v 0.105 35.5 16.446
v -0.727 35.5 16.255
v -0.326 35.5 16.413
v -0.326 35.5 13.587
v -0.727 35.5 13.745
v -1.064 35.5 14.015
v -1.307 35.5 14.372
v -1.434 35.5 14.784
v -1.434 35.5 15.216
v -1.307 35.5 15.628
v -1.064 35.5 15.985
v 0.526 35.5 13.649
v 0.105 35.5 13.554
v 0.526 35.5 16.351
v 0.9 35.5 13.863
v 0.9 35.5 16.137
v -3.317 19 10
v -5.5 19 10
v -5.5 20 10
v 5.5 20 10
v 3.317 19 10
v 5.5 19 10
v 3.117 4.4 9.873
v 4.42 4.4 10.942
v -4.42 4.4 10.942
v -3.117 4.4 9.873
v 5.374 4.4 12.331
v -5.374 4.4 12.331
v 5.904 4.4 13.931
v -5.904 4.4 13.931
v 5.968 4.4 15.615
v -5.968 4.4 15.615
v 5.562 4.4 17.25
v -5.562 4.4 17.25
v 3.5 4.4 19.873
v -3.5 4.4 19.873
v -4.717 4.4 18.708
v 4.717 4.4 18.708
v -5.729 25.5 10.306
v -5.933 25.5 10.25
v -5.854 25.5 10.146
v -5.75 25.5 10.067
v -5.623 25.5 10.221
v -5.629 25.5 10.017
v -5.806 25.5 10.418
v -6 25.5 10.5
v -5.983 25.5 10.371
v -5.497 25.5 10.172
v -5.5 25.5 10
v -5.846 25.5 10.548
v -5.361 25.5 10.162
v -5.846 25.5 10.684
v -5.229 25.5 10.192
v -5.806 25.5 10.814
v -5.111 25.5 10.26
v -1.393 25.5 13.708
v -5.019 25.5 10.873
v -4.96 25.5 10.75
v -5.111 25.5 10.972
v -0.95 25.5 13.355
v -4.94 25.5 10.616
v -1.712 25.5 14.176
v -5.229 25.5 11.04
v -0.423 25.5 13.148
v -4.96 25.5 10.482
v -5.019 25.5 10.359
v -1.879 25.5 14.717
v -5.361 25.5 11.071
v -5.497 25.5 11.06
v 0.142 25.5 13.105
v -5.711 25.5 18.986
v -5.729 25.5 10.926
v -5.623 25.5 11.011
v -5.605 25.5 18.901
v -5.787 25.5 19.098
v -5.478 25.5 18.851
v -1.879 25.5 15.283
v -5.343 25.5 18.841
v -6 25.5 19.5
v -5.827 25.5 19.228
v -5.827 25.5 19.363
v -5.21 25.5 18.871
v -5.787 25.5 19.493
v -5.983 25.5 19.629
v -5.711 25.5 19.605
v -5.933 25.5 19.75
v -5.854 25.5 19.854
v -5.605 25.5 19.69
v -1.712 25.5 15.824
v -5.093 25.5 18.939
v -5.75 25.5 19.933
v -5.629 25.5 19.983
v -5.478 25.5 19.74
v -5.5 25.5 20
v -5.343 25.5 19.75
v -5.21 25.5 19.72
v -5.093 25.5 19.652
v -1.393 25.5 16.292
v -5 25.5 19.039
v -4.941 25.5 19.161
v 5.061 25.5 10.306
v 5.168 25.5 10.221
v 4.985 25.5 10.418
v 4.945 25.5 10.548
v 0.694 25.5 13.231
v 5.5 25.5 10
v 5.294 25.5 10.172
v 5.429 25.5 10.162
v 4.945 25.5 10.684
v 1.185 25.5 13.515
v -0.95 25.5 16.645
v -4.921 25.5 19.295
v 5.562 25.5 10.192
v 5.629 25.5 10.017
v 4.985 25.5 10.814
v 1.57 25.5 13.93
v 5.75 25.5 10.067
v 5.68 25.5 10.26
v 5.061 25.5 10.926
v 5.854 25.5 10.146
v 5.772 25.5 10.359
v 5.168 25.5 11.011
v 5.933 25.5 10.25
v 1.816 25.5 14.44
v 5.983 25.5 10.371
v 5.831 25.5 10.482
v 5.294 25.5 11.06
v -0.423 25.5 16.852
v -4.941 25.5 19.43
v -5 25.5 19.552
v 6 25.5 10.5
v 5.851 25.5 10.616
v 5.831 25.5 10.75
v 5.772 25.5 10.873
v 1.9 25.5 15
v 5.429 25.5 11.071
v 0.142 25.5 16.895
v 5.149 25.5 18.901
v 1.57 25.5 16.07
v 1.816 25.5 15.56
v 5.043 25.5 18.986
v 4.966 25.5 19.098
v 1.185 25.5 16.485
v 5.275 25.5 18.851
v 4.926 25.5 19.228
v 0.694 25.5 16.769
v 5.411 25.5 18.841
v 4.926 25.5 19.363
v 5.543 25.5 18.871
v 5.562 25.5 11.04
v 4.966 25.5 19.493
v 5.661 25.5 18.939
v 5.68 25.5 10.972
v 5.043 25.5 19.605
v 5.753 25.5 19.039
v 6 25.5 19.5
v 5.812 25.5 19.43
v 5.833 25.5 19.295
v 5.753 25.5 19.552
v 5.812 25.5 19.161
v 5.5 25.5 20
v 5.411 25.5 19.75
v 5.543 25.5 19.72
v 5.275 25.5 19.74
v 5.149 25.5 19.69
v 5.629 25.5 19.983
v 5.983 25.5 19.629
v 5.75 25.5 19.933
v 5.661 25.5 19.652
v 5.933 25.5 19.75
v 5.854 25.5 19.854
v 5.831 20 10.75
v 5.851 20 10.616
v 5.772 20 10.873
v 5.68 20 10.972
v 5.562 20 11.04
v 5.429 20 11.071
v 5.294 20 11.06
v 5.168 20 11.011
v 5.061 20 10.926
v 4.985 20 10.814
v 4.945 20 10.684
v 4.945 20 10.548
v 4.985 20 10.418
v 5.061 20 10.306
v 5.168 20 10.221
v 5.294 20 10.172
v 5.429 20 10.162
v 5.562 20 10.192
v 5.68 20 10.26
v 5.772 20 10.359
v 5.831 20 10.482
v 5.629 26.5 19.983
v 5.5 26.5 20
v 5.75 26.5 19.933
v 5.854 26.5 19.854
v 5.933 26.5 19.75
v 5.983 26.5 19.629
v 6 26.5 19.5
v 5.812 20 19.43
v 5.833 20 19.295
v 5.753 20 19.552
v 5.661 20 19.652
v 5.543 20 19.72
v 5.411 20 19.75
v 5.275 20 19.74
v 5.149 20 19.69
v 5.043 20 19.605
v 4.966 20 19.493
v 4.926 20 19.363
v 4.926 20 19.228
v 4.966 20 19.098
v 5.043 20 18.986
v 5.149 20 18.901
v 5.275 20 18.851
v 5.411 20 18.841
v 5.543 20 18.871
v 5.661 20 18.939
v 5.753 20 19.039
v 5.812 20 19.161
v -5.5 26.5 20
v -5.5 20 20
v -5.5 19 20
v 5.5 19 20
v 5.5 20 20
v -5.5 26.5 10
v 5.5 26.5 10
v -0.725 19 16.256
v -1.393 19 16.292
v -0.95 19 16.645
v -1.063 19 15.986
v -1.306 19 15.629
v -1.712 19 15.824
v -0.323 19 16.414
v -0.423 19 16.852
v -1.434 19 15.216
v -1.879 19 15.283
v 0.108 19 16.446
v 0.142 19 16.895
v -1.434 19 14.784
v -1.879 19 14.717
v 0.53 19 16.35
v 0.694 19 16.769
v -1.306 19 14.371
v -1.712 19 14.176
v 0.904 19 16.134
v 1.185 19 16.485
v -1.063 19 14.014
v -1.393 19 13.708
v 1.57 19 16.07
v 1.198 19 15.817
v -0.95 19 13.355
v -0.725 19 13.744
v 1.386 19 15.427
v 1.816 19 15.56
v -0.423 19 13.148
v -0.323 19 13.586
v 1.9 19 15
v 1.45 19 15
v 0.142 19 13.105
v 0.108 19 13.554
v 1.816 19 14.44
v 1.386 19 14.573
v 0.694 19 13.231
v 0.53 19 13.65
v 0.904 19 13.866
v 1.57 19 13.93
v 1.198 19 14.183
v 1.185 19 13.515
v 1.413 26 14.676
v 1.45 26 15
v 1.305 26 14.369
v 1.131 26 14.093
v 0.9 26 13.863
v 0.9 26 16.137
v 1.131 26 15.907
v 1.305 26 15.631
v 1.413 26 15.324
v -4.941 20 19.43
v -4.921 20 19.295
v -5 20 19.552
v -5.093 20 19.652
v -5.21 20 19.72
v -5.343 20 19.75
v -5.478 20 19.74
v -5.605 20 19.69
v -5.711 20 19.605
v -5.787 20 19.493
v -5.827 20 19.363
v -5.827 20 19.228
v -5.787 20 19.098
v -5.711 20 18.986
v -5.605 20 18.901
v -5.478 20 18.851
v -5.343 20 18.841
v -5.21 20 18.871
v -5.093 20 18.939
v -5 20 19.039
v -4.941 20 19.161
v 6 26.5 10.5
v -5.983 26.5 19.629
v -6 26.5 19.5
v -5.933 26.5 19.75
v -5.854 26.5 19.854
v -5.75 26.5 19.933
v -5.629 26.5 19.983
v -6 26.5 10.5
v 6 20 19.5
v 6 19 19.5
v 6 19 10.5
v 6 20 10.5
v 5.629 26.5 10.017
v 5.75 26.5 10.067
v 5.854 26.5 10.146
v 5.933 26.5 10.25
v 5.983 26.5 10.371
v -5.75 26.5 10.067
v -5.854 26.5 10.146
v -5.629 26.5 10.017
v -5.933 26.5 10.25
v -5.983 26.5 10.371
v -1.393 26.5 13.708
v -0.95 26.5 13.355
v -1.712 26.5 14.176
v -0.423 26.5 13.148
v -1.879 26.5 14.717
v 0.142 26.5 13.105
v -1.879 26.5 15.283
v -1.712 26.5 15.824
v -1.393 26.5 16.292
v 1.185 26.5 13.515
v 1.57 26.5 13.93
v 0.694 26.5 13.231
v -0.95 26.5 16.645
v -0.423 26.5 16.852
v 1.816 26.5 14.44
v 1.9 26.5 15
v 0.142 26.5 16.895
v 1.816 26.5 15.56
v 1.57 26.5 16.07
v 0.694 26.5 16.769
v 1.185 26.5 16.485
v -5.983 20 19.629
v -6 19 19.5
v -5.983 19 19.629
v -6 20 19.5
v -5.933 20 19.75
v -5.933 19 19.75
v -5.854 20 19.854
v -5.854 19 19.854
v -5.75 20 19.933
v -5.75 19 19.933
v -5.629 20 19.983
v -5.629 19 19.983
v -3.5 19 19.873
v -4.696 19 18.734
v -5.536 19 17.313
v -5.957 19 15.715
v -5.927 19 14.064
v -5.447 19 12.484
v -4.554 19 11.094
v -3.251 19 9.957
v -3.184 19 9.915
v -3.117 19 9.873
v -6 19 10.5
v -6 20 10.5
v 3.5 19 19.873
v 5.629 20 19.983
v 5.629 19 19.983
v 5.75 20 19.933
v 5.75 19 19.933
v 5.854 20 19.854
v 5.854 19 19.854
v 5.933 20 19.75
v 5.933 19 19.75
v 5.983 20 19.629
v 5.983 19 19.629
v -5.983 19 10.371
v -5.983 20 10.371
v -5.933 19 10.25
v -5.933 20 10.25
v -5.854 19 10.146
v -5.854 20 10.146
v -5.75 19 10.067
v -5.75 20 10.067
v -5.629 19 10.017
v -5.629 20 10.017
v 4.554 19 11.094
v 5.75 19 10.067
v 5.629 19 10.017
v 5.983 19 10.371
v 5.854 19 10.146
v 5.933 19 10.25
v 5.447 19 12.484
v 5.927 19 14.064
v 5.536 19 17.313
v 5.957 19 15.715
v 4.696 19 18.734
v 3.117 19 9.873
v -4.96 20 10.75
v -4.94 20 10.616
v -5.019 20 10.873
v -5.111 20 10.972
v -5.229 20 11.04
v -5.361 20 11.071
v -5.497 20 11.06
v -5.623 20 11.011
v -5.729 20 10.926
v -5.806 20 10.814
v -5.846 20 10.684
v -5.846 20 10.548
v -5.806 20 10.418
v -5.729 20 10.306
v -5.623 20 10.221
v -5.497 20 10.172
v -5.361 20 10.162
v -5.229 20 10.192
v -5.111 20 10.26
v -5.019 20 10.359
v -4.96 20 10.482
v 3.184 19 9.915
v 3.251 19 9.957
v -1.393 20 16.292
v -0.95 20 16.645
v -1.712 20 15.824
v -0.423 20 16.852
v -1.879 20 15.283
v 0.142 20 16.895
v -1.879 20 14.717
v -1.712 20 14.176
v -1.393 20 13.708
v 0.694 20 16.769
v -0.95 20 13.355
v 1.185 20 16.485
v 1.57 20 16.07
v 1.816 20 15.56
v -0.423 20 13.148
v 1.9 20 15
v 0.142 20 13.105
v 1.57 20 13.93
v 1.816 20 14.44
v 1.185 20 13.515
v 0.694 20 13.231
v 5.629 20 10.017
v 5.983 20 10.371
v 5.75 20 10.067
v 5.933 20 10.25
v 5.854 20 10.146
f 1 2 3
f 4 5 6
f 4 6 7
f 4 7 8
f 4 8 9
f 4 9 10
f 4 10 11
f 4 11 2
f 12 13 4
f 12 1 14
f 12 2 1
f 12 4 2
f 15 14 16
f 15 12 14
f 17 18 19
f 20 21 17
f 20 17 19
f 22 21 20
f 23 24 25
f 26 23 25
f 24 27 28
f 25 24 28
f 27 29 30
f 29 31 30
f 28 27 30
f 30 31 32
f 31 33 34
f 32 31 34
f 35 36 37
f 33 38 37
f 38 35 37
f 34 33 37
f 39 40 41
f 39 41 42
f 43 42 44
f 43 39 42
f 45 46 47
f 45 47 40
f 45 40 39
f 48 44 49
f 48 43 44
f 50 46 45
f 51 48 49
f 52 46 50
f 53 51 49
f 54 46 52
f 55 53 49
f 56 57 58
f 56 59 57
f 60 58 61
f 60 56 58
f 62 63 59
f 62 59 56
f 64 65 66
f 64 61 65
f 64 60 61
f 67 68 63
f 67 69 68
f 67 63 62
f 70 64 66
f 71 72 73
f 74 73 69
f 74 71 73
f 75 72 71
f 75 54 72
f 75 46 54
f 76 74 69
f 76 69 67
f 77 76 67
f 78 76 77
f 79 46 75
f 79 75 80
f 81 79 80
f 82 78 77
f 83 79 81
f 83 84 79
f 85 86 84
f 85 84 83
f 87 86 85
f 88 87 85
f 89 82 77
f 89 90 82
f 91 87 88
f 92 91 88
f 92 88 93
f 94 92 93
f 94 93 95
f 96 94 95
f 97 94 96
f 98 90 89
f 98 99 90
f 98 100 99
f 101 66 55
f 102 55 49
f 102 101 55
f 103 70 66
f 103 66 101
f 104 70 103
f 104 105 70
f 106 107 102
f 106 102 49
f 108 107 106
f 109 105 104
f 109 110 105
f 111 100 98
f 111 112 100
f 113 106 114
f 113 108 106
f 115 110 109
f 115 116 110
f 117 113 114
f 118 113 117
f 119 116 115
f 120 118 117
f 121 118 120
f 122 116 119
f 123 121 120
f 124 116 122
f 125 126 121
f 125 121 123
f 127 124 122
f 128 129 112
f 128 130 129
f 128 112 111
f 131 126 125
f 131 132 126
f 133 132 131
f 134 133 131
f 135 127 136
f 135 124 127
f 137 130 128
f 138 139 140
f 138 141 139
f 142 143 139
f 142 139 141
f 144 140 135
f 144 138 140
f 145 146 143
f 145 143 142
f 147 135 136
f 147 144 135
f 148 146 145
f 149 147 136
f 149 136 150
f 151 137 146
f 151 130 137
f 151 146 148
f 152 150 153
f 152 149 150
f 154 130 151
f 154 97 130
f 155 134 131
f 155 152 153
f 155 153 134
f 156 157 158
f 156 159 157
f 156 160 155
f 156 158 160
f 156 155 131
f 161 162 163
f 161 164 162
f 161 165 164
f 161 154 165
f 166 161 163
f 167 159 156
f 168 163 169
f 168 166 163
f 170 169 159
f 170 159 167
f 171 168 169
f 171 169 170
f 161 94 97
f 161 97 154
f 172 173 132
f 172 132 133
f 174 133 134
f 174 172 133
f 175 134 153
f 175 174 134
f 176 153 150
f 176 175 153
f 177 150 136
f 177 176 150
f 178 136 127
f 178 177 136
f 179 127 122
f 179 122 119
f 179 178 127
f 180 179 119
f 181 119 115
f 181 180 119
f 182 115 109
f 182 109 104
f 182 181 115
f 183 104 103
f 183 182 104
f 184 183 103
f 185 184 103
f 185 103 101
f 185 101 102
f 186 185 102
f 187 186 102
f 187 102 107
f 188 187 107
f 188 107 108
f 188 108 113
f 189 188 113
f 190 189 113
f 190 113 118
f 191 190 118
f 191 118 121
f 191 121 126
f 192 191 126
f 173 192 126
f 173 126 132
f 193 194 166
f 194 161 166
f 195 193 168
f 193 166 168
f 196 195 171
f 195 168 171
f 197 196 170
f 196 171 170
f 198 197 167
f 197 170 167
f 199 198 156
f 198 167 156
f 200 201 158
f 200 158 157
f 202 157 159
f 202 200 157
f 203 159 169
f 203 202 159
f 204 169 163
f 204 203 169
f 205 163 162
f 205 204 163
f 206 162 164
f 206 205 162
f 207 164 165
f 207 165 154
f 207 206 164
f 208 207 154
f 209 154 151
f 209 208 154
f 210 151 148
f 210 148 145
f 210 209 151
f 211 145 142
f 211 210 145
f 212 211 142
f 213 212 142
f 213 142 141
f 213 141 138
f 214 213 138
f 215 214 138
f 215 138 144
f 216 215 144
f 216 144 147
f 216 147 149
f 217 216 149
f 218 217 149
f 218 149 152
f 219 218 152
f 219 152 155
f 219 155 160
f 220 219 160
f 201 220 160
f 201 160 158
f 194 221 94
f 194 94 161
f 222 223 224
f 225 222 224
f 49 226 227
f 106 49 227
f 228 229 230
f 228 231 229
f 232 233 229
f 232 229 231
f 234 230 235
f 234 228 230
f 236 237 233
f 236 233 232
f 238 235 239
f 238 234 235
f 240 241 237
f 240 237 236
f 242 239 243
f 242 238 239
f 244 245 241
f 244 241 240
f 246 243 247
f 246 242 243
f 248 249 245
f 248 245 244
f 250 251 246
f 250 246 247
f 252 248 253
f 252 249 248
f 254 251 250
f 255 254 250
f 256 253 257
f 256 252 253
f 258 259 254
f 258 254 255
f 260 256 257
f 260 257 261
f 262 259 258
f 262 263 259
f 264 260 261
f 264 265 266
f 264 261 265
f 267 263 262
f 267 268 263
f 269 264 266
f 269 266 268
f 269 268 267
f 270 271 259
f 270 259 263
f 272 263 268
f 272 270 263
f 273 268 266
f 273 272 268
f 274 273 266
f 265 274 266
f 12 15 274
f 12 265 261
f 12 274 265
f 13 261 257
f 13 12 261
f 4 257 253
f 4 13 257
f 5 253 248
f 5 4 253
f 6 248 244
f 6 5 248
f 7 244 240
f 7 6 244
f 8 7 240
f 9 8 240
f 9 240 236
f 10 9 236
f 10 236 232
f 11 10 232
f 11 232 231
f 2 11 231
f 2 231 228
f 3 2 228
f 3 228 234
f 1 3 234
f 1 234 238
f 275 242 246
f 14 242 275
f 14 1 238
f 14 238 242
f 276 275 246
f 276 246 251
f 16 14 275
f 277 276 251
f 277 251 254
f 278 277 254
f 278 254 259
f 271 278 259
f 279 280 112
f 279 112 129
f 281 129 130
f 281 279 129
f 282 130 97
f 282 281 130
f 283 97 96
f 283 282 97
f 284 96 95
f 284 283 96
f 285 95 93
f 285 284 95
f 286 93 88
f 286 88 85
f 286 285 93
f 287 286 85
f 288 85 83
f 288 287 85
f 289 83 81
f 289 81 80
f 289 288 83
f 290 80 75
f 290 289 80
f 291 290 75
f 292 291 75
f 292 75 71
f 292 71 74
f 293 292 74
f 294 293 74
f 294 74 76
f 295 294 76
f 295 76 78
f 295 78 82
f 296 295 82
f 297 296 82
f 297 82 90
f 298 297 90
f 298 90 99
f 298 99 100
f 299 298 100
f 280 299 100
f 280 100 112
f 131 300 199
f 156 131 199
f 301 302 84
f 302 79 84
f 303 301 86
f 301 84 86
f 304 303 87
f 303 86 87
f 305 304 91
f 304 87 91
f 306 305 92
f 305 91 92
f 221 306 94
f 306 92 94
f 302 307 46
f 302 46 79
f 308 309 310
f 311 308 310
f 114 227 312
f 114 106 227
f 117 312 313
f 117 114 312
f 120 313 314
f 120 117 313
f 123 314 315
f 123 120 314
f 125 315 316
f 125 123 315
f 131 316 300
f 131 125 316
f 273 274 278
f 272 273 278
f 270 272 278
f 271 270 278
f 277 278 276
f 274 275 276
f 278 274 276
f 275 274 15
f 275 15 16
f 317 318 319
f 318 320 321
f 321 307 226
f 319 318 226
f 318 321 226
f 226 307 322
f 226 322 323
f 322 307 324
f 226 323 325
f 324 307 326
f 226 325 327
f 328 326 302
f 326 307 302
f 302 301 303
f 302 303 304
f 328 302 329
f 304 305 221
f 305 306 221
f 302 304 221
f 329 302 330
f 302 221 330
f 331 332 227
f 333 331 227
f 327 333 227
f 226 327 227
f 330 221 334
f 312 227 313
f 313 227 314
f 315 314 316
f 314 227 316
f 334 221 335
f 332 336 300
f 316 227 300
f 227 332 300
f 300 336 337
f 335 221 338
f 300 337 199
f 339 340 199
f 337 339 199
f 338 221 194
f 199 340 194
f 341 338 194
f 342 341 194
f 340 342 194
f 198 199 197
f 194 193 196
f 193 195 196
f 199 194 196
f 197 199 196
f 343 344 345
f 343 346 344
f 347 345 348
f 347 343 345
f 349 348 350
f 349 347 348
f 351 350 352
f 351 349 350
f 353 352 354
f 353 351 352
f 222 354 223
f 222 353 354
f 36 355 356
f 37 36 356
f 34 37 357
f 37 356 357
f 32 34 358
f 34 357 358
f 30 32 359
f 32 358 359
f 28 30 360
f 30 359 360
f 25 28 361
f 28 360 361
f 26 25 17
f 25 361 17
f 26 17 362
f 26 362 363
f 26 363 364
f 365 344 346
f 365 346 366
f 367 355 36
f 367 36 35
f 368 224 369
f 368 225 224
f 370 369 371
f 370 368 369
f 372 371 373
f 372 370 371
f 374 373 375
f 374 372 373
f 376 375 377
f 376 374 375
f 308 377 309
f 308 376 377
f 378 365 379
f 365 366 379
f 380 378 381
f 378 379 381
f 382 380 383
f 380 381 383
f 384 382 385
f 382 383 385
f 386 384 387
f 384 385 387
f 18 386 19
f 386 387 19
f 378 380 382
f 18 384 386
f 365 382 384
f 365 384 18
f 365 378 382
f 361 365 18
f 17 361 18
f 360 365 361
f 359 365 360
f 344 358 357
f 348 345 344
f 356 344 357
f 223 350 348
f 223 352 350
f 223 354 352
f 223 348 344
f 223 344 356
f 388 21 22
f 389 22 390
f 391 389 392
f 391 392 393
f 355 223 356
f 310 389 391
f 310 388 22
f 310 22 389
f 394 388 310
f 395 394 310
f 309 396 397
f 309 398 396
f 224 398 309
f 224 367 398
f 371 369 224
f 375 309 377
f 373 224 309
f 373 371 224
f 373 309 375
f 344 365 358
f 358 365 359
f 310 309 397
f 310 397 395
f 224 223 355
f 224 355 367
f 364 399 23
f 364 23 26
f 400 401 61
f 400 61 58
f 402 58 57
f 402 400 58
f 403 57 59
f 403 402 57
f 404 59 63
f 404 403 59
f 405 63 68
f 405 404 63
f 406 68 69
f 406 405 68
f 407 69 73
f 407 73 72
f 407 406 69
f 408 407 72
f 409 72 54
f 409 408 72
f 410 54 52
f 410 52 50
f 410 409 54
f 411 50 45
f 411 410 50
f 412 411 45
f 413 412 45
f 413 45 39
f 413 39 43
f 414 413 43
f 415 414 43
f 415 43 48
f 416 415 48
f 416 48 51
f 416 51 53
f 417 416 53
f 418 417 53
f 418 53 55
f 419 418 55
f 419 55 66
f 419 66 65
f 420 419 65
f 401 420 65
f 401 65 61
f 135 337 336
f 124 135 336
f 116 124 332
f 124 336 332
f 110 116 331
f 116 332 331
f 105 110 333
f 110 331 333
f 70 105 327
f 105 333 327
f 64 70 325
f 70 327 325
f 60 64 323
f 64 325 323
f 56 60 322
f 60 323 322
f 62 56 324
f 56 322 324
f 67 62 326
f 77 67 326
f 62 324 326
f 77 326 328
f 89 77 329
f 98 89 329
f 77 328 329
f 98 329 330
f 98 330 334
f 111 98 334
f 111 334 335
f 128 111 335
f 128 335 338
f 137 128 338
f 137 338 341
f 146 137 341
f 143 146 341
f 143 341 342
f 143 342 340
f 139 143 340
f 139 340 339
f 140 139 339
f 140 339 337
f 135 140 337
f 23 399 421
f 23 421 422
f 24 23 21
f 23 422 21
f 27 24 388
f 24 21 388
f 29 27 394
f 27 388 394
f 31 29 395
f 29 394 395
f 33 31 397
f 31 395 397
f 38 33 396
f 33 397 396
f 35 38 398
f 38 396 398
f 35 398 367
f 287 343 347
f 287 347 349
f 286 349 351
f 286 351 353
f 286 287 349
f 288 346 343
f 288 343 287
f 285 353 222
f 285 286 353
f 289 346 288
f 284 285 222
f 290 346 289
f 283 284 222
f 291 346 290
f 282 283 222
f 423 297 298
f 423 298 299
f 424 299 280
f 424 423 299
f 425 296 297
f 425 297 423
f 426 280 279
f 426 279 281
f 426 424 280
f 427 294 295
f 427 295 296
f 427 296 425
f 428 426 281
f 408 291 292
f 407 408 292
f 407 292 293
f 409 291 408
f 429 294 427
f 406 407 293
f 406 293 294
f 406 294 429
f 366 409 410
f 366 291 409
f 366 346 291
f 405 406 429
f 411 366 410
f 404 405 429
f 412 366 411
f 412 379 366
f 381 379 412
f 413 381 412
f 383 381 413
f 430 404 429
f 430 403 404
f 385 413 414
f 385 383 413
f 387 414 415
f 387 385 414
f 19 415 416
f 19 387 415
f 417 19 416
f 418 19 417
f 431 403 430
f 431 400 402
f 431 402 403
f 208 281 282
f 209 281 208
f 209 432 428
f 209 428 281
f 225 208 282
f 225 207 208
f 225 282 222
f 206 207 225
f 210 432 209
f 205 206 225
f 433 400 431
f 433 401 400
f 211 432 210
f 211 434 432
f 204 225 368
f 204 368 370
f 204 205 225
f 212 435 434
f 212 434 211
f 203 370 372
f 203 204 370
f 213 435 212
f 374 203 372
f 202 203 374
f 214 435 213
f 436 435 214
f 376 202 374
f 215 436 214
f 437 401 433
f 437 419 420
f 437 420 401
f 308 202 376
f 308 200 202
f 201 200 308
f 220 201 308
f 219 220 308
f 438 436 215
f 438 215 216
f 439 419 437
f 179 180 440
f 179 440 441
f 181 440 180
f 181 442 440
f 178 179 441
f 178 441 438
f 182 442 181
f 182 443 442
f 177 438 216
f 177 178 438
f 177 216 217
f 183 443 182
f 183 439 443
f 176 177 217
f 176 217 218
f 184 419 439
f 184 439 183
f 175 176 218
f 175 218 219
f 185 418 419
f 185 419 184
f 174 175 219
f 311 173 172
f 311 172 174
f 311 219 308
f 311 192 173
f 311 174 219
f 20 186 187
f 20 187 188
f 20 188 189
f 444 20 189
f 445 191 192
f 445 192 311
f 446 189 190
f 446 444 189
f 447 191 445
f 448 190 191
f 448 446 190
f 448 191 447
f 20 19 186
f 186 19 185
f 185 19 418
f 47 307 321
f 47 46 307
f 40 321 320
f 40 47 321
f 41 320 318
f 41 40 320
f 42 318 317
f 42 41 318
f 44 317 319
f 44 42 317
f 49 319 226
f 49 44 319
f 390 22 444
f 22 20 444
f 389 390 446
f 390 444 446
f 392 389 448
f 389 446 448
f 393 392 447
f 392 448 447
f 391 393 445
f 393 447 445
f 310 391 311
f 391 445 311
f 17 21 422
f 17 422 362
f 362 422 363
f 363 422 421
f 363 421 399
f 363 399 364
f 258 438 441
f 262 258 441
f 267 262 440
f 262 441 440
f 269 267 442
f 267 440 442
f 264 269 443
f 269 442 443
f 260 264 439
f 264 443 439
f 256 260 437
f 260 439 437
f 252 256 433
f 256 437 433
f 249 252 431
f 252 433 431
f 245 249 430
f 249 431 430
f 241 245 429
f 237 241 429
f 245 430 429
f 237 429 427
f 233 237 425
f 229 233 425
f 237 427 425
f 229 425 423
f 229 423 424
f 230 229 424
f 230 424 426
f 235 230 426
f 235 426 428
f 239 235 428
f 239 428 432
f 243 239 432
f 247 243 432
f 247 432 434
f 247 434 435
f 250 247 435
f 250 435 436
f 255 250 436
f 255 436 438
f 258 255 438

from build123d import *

# Parameters (mm, degrees)
PAD011_DEPTH    = 14.6
SKETCH023_W     = 12
SKETCH023_H     = 10
PAD012_DEPTH    = 1
FILLET003_R     = 0.5
SKETCH024_R     = 0.455689
PAD013_DEPTH    = 7.5
SKETCH025_W     = 12
SKETCH025_H     = 10
PAD014_DEPTH    = 1
SKETCH026_R     = 1.9
POCKET008_DEPTH = 7.5
SKETCH027_R     = 1.45
PAD015_DEPTH    = 9
FILLET004_R     = 0.5
POCKET009_DEPTH = 10


with BuildPart() as part:
    # Sketch022 → Pad011 (new body)
    with BuildSketch(Plane.XZ):
        with BuildLine():
            Line((-3.5, 19.873397), (3.5, 19.873397))
            ThreePointArc((3.117362, 9.873397), (5.995612, 14.770585), (3.5, 19.873397))
            Line((3.117362, 9.873397), (-3.117362, 9.873397))
            ThreePointArc((-3.5, 19.873397), (-5.995612, 14.770585), (-3.117362, 9.873397))
        make_face()
    extrude(amount=PAD011_DEPTH)

    # Sketch023 (on Face5 of Pad011) → Pad012 (join)
    with BuildSketch(Plane(origin=(0, 0, 0), x_dir=(1, 0, 0), z_dir=(0, 1, 0))):
        with Locations((0, -15)):
            Rectangle(SKETCH023_W, SKETCH023_H)
    extrude(amount=PAD012_DEPTH)

    # Fillet003
    fillet003_edges = [part.edges().sort_by_distance(p)[0] for p in [
        (6, 0.5, 20),
        (6, 0.5, 10),
        (-6, 0.5, 10),
        (-6, 0.5, 20),
    ]]
    fillet(fillet003_edges, radius=FILLET003_R)

    # Sketch024 → Pad013 (join)
    with BuildSketch(Plane.XZ):
        with Locations((-5.376898, 19.295448)):
            Circle(SKETCH024_R)
        with Locations((-5.395437, 10.616136)):
            Circle(SKETCH024_R)
        with Locations((5.395437, 10.616136)):
            Circle(SKETCH024_R)
        with Locations((5.376898, 19.295448)):
            Circle(SKETCH024_R)
    extrude(amount=-PAD013_DEPTH)

    # Sketch025 → Pad014 (join)
    with BuildSketch(Plane.XZ.offset(-7.5)):
        with Locations((0, 15)):
            Rectangle(SKETCH025_W, SKETCH025_H)
    extrude(amount=PAD014_DEPTH)

    # Sketch026 (on Face32 of Pad014) → Pocket008 (cut)
    with BuildSketch(Plane(origin=(0, 7.5, 0), x_dir=(1, 0, 0), z_dir=(0, 1, 0))):
        with Locations((0, -15)):
            Circle(SKETCH026_R)
    extrude(amount=-POCKET008_DEPTH, mode=Mode.SUBTRACT)

    # Sketch027 (on Face35 of Pocket008) → Pad015 (join, symmetric)
    with BuildSketch(Plane(origin=(0, 7.5, 0), x_dir=(1, 0, 0), z_dir=(0, 1, 0))):
        with Locations((0, -15)):
            Circle(SKETCH027_R)
    extrude(amount=PAD015_DEPTH, both=True)

    # Fillet004
    fillet004_edges = [part.edges().sort_by_distance(p)[0] for p in [
        (-6, 7, 20),
        (-6, 7, 10),
        (6, 7, 10),
        (6, 7, 20),
    ]]
    fillet(fillet004_edges, radius=FILLET004_R)

    # Sketch028 → Pocket009 (cut)
    with BuildSketch(Plane.XZ.offset(-7)):
        with BuildLine():
            ThreePointArc((0.9, 13.863118), (1.45, 15), (0.9, 16.136882))
            Line((0.9, 13.863118), (0.9, 16.136882))
        make_face()
    extrude(amount=-POCKET009_DEPTH, mode=Mode.SUBTRACT)


with BuildPart() as part_1:
    # Body007 placement: moved
    add(part.part.moved(Location((0, 19, 0))))


solid = part_1.part
